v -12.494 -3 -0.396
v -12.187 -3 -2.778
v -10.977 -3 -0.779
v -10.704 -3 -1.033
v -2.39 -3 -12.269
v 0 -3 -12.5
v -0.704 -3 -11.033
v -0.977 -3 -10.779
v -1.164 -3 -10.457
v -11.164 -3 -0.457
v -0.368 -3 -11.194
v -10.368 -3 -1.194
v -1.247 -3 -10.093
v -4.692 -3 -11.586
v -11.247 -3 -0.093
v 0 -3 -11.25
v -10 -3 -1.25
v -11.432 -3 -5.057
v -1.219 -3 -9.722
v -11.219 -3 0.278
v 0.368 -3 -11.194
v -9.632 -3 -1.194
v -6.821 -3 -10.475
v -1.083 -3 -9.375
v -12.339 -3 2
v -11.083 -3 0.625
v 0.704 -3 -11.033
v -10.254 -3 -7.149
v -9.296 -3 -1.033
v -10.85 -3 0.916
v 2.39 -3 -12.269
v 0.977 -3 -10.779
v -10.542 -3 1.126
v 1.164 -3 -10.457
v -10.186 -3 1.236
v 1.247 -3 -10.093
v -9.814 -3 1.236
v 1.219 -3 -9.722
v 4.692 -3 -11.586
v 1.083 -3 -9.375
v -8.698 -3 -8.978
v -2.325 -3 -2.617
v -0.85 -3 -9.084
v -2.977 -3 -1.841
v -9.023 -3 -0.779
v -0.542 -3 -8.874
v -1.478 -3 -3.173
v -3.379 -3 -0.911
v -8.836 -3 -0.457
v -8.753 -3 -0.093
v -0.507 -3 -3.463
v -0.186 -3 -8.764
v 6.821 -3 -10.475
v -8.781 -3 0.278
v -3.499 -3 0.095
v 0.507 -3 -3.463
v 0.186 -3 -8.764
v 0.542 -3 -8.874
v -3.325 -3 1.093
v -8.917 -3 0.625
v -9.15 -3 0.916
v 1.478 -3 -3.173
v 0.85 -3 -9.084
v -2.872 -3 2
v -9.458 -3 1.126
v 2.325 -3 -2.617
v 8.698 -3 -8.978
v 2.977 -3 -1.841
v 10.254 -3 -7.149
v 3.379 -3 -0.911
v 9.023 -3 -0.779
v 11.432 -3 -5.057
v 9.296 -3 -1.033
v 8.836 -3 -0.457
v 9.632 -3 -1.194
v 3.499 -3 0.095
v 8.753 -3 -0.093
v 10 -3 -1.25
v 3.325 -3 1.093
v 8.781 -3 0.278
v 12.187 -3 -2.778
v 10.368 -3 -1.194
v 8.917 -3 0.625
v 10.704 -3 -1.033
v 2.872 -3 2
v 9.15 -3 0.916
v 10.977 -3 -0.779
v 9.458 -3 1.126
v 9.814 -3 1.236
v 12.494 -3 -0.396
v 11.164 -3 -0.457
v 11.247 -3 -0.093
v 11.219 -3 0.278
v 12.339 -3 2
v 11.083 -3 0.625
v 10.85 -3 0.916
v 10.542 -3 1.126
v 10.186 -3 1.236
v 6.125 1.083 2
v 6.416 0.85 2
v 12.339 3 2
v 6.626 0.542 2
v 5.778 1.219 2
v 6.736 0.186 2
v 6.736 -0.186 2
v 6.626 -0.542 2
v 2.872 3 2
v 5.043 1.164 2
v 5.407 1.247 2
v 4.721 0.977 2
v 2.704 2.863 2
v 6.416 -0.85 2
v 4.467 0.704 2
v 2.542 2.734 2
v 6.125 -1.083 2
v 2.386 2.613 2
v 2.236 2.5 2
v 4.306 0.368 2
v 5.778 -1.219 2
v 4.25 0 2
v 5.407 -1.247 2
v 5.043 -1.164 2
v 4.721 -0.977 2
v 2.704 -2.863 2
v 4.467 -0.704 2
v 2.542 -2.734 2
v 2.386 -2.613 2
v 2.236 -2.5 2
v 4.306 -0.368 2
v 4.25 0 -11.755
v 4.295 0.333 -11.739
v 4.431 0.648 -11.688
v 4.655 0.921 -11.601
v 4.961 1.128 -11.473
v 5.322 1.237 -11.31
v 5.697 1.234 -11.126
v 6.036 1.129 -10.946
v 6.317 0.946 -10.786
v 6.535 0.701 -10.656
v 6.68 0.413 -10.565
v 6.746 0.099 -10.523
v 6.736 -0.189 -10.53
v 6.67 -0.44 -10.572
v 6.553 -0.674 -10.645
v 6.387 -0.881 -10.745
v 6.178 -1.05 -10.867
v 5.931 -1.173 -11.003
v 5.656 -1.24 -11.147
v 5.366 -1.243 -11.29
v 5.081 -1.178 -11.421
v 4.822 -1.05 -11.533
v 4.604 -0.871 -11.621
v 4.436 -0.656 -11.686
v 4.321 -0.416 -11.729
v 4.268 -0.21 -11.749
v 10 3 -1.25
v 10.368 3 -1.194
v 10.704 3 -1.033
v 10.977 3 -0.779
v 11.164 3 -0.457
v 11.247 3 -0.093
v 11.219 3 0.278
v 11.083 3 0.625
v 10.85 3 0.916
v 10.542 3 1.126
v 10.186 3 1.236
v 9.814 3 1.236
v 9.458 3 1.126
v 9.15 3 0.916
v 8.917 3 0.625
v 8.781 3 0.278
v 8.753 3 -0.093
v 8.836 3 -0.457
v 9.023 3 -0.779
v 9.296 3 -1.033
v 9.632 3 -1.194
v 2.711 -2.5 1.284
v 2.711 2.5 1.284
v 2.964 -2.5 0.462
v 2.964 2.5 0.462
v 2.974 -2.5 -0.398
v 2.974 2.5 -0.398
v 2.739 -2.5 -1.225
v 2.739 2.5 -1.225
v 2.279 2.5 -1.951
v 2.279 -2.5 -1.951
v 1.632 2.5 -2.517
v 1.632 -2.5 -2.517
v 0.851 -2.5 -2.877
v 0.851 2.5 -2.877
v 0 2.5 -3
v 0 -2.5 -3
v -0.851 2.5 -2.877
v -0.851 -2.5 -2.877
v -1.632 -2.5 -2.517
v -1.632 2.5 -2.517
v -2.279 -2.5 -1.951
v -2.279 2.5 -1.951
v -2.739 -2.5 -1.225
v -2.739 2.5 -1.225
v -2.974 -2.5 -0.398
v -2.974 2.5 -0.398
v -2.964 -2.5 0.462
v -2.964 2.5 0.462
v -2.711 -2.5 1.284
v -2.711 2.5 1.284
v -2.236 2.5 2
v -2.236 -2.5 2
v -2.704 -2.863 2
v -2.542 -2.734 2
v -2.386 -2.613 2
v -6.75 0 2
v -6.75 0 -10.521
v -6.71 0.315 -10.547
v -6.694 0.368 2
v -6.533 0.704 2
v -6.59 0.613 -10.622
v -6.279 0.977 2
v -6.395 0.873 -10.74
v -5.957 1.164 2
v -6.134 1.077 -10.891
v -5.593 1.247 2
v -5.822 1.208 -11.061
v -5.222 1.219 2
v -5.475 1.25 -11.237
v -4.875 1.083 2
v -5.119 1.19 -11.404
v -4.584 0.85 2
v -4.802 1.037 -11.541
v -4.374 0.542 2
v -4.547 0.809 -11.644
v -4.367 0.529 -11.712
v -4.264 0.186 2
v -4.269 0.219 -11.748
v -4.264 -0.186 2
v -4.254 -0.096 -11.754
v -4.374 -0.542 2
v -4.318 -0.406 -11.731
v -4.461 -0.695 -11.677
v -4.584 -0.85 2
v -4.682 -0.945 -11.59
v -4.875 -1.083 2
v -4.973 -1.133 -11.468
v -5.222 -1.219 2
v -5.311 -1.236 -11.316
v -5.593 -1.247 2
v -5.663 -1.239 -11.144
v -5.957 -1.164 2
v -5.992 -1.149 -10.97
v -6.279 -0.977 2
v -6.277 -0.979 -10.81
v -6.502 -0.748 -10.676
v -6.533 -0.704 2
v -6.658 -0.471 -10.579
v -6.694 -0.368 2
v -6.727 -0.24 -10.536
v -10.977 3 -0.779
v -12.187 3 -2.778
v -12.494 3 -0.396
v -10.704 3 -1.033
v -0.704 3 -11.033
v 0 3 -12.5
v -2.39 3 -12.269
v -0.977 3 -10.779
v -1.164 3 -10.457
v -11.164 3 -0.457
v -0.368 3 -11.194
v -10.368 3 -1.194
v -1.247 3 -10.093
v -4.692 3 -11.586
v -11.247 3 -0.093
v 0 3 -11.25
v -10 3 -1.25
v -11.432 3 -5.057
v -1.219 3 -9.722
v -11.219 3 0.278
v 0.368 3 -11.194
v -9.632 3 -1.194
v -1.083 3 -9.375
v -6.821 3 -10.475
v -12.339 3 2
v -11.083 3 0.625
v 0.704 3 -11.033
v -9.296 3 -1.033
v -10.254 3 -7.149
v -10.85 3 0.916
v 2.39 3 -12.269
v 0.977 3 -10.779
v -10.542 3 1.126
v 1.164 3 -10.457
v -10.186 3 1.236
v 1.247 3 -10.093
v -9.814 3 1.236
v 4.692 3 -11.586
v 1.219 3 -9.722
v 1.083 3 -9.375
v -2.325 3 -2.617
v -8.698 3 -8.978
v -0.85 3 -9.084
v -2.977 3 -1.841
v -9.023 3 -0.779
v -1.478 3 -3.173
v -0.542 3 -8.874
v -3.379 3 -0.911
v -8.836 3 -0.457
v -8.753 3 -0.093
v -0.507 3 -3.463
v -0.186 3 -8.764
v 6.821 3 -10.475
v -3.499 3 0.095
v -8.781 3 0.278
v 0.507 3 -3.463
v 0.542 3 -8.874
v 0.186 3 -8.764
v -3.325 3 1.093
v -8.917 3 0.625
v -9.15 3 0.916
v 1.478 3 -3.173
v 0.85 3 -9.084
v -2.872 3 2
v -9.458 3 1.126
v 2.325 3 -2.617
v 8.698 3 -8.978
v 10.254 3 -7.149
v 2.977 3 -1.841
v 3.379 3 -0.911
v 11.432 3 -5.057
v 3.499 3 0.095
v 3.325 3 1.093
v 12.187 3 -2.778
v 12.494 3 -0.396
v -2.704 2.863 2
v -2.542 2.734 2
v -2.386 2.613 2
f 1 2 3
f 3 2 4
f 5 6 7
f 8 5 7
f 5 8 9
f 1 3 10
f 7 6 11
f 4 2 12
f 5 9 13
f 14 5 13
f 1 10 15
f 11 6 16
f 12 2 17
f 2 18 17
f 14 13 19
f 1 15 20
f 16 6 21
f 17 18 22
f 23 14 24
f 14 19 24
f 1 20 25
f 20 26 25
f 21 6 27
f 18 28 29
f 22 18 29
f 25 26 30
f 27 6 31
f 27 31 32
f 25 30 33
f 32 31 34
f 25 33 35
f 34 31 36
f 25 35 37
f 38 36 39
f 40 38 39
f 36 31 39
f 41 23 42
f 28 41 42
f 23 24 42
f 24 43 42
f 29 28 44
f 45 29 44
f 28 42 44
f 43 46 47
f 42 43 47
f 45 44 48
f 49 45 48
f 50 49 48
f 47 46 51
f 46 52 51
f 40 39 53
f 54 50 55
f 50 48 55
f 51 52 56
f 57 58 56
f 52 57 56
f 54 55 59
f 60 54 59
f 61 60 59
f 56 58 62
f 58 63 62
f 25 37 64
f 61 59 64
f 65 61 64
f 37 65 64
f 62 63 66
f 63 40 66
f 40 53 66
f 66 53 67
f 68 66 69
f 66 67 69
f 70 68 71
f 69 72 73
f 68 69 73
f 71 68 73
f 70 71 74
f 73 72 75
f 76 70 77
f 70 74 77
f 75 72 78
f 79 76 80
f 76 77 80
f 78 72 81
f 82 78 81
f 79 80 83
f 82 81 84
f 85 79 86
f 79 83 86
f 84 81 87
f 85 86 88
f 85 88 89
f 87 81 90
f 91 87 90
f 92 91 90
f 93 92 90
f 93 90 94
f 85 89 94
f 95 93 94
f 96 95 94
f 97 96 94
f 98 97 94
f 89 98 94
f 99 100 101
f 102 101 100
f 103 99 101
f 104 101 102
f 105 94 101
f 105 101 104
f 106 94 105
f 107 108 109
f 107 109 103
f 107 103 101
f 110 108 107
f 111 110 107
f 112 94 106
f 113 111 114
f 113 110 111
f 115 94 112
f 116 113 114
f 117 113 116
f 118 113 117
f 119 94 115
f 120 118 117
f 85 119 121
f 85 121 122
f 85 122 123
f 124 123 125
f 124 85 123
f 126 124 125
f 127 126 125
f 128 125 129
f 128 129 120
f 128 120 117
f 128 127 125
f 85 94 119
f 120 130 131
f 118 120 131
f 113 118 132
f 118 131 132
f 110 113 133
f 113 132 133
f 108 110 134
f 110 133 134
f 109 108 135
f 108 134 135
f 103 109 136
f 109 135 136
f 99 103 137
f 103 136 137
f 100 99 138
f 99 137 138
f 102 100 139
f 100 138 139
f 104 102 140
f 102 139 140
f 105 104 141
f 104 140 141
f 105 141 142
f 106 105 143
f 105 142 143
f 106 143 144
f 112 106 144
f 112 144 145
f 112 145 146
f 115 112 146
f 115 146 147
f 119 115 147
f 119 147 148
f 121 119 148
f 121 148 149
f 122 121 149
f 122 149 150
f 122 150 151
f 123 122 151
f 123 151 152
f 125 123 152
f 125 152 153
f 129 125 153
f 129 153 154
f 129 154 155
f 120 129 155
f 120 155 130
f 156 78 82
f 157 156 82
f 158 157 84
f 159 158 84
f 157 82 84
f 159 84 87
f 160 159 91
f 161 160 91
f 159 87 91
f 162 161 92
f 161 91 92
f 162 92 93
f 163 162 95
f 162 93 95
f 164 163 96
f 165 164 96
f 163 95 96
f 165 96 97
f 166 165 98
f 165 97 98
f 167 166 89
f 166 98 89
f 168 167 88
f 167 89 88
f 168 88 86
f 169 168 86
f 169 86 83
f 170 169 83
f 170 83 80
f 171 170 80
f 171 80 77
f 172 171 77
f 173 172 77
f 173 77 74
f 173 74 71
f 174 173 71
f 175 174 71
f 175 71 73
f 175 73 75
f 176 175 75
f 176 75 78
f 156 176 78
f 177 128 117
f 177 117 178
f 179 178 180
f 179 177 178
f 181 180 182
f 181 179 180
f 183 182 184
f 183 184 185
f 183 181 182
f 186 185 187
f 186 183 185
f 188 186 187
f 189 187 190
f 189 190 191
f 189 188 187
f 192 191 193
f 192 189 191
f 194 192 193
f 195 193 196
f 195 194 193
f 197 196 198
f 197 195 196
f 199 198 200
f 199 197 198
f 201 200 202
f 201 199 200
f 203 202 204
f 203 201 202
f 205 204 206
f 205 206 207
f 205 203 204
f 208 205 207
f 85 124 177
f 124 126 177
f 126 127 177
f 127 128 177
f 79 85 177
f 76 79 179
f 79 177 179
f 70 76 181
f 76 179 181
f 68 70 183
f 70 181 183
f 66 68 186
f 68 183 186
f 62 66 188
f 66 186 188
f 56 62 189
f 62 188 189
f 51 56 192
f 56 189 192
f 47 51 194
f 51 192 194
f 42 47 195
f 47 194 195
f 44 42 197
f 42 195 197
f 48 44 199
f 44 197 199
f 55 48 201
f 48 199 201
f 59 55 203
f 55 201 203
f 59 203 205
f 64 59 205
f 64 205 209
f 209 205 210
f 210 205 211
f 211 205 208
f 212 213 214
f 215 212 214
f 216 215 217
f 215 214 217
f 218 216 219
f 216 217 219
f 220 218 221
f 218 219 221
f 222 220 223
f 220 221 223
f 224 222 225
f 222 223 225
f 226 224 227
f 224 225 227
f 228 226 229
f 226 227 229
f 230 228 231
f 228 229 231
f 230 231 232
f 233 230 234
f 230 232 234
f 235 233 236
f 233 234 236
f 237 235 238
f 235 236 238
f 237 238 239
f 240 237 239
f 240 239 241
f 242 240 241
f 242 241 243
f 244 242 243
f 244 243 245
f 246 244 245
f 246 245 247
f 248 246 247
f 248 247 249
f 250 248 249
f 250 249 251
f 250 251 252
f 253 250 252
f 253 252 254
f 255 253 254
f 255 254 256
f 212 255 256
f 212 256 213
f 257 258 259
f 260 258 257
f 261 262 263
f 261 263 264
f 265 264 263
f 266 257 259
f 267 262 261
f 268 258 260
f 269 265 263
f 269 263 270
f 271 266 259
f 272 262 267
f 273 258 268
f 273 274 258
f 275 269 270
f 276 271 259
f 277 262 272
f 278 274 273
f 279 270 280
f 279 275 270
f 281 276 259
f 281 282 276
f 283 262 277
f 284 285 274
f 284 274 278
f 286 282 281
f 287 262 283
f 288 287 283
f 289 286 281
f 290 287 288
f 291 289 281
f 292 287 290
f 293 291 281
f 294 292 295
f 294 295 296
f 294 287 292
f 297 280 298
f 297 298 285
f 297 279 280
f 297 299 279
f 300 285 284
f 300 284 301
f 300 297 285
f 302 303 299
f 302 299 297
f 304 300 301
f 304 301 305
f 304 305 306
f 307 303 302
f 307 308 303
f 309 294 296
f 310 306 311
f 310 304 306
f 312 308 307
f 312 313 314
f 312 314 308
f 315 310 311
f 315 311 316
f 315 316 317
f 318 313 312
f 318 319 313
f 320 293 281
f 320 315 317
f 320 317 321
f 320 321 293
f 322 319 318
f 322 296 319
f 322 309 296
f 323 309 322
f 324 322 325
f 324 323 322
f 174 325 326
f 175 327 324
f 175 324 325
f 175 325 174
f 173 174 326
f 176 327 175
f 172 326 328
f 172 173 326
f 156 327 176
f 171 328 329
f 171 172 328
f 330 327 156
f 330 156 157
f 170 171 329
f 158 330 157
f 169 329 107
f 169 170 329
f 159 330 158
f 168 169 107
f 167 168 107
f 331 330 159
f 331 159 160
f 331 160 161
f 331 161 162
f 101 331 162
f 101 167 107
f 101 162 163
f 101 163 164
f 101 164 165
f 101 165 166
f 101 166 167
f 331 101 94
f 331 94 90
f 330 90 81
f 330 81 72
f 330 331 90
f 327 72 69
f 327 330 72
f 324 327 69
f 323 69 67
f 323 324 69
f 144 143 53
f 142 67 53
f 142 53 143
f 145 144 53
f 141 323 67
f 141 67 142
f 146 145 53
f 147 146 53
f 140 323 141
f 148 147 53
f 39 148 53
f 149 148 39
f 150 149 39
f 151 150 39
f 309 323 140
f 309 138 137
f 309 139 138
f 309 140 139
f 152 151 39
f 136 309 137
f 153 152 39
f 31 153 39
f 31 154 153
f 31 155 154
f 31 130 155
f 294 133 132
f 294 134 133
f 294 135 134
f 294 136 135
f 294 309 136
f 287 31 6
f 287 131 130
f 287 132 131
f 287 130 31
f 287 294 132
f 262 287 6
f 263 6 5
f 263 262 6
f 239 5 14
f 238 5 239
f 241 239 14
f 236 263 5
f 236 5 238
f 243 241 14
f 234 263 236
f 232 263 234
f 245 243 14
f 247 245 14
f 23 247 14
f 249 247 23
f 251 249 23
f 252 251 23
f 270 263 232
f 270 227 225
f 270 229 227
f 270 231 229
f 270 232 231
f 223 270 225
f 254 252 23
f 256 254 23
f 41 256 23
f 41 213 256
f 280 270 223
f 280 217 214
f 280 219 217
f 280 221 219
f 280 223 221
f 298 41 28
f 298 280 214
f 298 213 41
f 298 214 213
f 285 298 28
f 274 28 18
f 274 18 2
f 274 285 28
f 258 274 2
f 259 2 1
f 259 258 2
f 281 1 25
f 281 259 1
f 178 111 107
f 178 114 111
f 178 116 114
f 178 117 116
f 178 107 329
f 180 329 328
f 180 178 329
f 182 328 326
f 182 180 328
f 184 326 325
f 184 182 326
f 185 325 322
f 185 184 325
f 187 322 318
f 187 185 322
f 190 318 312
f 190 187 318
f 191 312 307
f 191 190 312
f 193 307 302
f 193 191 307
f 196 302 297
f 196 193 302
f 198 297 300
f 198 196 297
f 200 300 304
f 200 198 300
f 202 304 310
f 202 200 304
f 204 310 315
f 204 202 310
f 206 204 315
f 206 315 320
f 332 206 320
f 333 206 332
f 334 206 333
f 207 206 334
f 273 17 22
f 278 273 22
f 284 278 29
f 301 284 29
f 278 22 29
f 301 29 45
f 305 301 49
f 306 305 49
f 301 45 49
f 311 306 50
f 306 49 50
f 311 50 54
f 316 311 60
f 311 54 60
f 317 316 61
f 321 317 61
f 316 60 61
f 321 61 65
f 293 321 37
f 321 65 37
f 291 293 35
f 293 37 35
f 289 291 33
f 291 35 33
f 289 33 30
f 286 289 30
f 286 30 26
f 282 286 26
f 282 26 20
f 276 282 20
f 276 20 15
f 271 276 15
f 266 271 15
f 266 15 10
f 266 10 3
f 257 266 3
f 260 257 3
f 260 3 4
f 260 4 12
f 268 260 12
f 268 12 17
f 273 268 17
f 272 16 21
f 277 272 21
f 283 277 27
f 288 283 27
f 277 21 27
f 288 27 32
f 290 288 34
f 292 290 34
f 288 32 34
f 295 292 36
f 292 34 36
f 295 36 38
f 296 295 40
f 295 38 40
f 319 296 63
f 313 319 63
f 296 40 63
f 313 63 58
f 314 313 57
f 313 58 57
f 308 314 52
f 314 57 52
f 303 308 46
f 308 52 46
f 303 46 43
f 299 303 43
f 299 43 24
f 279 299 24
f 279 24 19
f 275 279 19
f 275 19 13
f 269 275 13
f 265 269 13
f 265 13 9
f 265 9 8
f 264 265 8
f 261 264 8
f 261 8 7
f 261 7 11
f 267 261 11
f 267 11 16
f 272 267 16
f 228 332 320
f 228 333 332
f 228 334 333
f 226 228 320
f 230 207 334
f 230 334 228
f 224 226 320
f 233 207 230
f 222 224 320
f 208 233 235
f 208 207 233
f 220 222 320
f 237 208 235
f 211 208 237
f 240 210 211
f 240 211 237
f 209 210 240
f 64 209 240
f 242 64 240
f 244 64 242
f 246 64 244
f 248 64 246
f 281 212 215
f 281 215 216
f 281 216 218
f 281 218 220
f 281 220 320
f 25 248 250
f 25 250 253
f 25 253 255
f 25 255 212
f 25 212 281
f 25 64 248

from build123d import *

# Parameters (mm, degrees)
SKETCH_1_R               = 12.5
SKETCH_1_R_2             = 3
EXTRUDE_1_DEPTH          = 3
HOLE_WIZARD_M3_2_D       = 2.5
CUT_EXTRUDE_1_DEPTH      = 19.668154703
CUT_EXTRUDE_1_DEPTH_BACK = 19.668154703
HOLE_WIZARD_M3_1_D       = 2.5
CHAMFER_1_SIZE           = 0.5


with BuildPart() as part:
    # 草图1 → 凸台-拉伸1 (new, symmetric)
    with BuildSketch(Plane(origin=(0, 0, 0), x_dir=(1, 0, 0), z_dir=(0, 1, 0))):
        with Locations(Location((0, 0, 0), (0, 0, 270))):
            Circle(SKETCH_1_R)
        with Locations(Location((0, 0, 0), (0, 0, 270))):
            Circle(SKETCH_1_R_2, mode=Mode.SUBTRACT)
    extrude(amount=EXTRUDE_1_DEPTH, both=True)

    # M3 螺纹孔2 (through all)
    with Locations(Plane(origin=(0, 3, -10), x_dir=(0, 0, 1), z_dir=(0, 1, 0))):
        with Locations((0, 0), (10, 10), (20, 0), (10, -10)):
            Hole(HOLE_WIZARD_M3_2_D / 2)

    # 草图4 → 切除-拉伸1 (cut, two sides: drawn at the far end of the back side and taken through both)
    with BuildSketch(Plane(origin=(0, 3, 0), x_dir=(1, 0, 0), z_dir=(0, 1, 0)).offset(-CUT_EXTRUDE_1_DEPTH_BACK)):
        Polygon((-79.861969102, -2), (-12.338962679, -2), (12.338962679, -2), (79.861969102, -2), (79.861969102, -137.046012846), (-79.861969102, -137.046012846), align=None)
    extrude(amount=CUT_EXTRUDE_1_DEPTH + CUT_EXTRUDE_1_DEPTH_BACK, mode=Mode.SUBTRACT)

    # M3 螺纹孔1 (through all)
    with Locations(Plane(origin=(-5.5, 0, 2), x_dir=(1, 0, 0), z_dir=(0, 0, 1))):
        with Locations((0, 0), (11, 0)):
            Hole(HOLE_WIZARD_M3_1_D / 2)

    # 倒角1
    chamfer_1_edges = [part.edges().sort_by_distance(p)[0] for p in [
        (0, -3, -3),
        (0, 3, -3),
    ]]
    chamfer(chamfer_1_edges, length=CHAMFER_1_SIZE)


solid = part.part
